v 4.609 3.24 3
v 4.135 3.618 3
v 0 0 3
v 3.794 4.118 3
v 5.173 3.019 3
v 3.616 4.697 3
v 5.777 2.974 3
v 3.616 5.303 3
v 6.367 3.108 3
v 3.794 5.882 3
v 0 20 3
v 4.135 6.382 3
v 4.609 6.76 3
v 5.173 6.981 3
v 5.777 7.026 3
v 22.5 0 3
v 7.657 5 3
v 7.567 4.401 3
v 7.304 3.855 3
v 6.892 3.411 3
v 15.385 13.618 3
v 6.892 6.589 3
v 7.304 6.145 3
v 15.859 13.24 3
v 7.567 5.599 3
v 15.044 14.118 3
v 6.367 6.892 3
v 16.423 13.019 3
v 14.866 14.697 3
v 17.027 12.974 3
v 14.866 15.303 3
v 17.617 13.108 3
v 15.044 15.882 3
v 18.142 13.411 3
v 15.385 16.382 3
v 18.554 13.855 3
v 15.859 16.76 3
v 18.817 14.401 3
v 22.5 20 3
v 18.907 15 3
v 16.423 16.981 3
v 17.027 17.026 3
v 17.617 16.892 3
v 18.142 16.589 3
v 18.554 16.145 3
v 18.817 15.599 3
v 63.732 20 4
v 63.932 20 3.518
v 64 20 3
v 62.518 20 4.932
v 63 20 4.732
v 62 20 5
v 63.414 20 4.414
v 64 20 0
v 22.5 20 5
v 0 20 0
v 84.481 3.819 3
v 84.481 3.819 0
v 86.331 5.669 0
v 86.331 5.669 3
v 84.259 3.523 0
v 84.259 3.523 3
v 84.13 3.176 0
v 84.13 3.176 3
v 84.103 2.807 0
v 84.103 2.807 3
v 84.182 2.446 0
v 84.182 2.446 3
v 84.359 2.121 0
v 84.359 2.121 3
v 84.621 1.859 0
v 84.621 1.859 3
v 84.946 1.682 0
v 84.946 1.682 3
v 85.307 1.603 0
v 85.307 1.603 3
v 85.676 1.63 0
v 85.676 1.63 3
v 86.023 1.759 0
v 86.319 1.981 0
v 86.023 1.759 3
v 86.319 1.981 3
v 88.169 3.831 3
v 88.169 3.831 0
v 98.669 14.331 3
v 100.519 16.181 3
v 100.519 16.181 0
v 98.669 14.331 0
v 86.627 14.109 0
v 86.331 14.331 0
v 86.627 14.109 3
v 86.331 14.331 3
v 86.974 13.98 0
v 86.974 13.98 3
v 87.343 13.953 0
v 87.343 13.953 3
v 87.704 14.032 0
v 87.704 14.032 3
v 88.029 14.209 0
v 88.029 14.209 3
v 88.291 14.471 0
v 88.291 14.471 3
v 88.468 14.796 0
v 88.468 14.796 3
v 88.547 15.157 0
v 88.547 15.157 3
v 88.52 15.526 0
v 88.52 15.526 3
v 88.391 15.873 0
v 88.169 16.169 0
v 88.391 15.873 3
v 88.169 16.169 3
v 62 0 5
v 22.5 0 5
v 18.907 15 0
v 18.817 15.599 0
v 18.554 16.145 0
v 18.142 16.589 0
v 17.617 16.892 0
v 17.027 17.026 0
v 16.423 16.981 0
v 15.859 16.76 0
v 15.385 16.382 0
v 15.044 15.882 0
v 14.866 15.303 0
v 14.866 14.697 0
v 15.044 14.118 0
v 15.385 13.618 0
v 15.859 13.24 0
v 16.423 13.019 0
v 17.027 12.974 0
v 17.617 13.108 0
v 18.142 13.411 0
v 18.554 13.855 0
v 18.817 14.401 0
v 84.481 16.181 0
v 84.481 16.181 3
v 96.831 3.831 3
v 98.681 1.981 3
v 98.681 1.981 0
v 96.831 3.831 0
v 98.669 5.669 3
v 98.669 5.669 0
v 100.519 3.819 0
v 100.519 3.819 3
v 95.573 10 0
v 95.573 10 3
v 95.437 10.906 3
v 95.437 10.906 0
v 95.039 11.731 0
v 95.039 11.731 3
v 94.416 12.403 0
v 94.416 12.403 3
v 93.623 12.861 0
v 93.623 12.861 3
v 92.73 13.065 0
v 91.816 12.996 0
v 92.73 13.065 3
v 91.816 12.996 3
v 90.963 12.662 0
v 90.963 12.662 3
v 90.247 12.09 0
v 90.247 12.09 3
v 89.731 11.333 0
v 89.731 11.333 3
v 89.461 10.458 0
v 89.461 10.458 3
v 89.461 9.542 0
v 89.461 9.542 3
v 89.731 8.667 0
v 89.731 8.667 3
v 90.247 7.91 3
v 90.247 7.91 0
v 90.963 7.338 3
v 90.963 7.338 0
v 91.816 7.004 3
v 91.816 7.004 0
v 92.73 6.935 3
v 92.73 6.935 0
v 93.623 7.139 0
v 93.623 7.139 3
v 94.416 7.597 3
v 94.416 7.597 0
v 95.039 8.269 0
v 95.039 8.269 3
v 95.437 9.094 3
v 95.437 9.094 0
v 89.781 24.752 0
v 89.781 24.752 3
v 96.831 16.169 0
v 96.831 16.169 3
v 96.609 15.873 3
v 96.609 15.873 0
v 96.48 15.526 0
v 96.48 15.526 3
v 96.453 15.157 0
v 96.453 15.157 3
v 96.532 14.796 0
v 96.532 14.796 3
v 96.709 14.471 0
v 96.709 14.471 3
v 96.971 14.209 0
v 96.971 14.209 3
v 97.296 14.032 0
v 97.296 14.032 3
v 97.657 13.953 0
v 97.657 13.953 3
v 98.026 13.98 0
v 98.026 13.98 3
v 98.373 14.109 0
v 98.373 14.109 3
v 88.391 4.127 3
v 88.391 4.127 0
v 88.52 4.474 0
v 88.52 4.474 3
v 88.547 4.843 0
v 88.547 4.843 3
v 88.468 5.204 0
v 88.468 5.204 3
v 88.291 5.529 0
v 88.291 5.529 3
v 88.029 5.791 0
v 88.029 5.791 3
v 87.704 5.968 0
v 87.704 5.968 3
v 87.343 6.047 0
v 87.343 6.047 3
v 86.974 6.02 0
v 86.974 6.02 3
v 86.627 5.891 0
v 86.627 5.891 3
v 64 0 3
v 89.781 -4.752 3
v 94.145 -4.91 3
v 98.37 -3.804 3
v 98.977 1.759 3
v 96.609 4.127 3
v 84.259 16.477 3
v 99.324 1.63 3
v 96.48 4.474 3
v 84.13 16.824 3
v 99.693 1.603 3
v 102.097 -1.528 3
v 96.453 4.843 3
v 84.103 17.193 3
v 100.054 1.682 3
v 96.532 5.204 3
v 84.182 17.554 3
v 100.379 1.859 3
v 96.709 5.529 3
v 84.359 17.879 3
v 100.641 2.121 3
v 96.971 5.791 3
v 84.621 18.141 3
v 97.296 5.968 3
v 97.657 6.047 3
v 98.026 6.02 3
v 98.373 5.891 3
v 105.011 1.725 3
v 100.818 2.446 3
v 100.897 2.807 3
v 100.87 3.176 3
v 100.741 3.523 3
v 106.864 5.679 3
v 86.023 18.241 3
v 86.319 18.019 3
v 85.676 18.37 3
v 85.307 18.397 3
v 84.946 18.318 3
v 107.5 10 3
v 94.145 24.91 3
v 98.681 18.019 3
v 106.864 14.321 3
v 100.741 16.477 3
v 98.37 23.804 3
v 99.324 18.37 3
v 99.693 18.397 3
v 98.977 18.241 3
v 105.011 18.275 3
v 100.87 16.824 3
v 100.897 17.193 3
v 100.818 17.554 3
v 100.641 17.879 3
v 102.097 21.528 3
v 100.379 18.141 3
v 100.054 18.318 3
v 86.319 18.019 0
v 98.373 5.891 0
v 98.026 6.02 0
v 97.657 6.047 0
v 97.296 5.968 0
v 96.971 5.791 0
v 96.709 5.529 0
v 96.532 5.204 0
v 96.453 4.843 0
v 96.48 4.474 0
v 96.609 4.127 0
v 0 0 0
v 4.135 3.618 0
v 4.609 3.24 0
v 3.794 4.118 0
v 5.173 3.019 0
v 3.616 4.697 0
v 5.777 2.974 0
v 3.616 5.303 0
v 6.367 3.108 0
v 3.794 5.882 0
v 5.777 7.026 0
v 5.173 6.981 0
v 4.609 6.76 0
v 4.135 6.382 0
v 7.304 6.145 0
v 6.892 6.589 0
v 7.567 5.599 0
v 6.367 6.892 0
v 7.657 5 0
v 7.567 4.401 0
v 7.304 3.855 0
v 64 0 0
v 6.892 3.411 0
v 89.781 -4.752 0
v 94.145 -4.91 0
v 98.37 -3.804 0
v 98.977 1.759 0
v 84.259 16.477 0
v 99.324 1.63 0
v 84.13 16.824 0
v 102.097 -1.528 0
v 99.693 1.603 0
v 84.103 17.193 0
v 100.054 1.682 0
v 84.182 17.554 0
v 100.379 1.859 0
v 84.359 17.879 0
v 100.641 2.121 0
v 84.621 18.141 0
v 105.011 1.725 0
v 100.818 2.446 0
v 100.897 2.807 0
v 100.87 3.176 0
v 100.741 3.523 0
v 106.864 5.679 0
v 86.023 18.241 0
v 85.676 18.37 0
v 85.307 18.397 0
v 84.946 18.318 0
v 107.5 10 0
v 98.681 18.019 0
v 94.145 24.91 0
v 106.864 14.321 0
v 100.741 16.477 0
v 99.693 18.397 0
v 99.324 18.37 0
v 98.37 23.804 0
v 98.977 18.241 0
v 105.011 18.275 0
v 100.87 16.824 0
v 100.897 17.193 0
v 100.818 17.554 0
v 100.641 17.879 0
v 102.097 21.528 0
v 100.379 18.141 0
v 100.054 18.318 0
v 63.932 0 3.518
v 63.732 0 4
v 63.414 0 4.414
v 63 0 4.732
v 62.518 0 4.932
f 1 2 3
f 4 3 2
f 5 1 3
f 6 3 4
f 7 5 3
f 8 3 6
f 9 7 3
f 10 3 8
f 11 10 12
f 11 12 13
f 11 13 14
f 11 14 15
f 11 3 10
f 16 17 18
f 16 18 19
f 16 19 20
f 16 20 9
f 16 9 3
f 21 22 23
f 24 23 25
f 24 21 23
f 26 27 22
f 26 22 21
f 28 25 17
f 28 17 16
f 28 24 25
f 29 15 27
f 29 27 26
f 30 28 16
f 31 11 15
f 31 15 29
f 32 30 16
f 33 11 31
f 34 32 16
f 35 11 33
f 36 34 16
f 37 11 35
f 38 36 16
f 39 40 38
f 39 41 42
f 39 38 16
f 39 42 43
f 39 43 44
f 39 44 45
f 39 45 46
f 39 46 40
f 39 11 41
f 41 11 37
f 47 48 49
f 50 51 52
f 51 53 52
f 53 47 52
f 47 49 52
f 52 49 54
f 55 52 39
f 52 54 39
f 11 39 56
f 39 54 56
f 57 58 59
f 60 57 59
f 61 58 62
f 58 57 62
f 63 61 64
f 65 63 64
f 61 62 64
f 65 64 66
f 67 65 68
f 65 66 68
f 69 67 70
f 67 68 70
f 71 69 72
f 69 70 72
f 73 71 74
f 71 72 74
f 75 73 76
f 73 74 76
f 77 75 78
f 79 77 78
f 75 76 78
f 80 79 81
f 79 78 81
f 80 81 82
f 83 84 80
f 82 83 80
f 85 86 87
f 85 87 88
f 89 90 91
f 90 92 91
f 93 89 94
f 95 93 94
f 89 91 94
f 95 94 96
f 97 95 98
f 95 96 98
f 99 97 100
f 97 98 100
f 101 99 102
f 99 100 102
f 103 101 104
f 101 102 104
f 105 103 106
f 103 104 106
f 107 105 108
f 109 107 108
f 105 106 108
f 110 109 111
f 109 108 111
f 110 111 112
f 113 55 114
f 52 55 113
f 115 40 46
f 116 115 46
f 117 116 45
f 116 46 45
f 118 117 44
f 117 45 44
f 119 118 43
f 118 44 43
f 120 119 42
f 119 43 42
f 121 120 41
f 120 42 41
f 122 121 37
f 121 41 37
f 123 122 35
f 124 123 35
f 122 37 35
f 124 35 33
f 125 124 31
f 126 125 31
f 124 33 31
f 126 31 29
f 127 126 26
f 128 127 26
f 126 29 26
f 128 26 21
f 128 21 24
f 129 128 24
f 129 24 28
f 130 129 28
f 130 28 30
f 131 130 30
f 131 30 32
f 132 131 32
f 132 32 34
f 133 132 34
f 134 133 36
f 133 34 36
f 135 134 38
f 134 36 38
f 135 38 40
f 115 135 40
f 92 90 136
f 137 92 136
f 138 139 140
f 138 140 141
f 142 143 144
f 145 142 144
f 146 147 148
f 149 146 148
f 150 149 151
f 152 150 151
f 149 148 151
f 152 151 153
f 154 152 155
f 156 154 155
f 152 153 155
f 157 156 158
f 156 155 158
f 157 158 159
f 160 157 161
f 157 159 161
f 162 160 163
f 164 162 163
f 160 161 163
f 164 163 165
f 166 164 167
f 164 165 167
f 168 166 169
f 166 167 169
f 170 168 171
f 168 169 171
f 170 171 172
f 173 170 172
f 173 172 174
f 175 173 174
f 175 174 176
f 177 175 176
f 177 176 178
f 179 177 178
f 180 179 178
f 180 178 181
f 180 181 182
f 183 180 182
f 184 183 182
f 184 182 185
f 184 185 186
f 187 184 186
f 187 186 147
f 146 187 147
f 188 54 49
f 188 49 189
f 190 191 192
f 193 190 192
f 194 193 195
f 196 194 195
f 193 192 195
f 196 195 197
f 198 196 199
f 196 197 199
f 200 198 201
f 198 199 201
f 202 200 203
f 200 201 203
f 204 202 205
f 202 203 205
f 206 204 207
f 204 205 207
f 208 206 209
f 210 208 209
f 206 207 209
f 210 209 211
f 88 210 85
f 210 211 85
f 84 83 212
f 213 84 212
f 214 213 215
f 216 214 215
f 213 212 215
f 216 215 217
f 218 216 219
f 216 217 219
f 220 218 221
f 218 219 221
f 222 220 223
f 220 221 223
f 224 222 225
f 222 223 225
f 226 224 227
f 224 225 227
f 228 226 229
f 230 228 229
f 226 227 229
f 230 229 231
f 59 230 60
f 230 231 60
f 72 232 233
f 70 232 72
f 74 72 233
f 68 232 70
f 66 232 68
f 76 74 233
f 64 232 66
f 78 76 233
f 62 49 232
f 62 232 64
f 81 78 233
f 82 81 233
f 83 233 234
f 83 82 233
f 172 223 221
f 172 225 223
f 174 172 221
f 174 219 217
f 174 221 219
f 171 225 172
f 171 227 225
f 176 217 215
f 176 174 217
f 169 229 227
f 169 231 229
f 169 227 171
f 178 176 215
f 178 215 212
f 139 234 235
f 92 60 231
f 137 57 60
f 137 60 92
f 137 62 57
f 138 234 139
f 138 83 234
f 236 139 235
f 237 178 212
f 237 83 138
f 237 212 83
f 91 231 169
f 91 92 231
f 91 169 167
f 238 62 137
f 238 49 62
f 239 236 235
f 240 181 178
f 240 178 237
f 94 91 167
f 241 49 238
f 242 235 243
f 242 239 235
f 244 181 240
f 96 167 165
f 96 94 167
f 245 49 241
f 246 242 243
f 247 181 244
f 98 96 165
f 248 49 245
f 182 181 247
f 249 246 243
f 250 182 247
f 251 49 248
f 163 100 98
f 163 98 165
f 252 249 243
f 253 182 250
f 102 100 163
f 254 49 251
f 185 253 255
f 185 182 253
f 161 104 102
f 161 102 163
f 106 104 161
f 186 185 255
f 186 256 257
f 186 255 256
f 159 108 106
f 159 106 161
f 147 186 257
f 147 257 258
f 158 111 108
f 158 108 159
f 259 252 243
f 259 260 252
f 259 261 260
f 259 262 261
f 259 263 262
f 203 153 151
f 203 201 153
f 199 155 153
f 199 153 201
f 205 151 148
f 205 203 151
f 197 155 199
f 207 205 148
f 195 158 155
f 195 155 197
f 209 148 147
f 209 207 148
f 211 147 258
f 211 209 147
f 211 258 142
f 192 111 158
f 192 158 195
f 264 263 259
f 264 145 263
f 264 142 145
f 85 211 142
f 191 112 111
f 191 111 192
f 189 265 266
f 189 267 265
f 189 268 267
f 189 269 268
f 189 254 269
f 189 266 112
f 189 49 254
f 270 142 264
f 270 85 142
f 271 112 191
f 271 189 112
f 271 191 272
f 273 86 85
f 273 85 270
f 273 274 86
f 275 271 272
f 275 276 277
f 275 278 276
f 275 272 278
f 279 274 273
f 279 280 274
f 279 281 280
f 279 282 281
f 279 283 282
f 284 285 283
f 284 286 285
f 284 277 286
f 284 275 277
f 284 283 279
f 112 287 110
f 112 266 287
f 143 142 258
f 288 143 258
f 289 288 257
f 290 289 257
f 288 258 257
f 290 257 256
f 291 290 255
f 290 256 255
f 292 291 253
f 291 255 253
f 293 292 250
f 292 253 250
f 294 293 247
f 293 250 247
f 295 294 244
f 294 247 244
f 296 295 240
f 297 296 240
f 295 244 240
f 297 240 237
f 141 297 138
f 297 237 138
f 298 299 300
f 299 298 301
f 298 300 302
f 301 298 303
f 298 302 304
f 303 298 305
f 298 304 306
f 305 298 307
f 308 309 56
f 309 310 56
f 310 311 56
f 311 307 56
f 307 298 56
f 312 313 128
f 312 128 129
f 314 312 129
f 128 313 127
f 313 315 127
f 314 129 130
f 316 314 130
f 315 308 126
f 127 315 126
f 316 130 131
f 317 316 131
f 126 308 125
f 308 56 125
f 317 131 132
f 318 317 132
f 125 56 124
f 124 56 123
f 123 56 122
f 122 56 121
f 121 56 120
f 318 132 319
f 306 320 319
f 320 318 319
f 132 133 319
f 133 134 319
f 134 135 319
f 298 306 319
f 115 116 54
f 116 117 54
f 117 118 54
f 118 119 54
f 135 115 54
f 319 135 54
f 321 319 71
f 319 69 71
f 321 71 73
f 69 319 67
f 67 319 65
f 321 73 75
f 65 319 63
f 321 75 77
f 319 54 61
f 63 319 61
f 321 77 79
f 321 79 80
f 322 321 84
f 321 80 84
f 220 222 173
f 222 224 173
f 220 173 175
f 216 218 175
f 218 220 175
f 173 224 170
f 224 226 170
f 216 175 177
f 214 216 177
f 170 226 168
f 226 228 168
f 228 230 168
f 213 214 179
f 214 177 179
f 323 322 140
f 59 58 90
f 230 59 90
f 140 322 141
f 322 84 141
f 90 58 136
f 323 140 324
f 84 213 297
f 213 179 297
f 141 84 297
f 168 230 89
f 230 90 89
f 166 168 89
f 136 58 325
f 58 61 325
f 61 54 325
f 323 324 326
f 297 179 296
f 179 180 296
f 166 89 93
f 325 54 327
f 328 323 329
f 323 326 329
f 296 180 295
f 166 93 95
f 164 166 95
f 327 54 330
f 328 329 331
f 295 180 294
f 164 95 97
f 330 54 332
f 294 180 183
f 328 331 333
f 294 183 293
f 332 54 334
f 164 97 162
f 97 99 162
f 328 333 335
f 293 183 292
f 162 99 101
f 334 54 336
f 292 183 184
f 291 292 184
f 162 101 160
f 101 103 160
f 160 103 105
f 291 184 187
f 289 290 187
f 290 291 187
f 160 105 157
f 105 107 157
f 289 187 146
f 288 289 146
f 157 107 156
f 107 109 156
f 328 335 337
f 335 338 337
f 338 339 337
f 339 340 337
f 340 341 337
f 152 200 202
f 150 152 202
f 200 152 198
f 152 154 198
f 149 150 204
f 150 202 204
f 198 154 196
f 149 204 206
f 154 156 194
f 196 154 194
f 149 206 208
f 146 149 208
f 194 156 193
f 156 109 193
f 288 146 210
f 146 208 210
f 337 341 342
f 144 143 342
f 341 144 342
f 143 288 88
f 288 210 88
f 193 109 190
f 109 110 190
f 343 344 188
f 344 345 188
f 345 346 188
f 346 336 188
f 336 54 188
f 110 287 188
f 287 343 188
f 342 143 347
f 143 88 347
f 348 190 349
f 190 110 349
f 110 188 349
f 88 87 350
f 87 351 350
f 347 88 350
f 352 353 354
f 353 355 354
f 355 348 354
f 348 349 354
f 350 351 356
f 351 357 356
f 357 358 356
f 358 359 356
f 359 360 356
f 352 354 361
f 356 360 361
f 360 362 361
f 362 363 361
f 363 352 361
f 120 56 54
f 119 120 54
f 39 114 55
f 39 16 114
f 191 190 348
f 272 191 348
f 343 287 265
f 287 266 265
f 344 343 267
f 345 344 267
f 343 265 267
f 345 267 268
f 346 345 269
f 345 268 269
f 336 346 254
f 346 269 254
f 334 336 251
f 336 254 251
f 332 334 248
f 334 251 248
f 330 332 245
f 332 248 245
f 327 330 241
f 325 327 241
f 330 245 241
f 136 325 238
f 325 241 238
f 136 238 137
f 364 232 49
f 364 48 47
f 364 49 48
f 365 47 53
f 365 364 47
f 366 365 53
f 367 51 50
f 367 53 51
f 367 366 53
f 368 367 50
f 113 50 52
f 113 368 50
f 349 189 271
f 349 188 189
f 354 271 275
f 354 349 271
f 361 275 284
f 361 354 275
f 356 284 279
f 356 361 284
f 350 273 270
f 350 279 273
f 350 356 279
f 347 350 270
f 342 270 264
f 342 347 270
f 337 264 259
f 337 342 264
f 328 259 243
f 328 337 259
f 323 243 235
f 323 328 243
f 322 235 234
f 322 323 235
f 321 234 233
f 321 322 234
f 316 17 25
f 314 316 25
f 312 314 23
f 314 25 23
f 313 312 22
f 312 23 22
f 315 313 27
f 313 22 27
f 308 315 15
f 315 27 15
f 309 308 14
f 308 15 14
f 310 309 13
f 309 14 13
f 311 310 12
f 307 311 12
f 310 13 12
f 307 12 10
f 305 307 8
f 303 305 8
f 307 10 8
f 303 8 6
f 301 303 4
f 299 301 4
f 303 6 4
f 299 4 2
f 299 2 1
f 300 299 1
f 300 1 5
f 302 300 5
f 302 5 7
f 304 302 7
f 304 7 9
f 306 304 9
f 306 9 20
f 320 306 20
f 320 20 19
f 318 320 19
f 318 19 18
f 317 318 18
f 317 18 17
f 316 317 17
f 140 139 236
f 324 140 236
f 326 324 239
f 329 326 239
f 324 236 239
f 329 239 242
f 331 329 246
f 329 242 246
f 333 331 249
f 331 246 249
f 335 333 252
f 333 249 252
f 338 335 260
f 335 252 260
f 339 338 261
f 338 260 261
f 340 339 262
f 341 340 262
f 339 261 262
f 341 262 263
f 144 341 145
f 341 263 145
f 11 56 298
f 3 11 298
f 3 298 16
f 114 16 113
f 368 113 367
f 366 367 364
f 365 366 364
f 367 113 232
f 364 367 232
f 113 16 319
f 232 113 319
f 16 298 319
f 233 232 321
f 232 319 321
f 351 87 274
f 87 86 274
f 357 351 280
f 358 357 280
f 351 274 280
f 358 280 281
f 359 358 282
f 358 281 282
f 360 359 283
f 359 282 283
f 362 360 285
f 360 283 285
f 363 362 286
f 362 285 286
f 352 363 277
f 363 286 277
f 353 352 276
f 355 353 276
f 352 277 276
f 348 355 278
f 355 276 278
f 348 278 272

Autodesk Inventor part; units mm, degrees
ref_plane "YZ Plane" through (0, 0, 0) normal (1, 0, 0) x (0, 1, 0)
ref_plane "XZ Plane" through (0, 0, 0) normal (0, 1, 0) x (-1, 0, 0)
ref_plane "XY Plane" through (0, 0, 0) normal (0, 0, 1) x (1, 0, 0)
sketch "Sketch1" plane through (0, 0, 0) normal (0, 0, 1) x (1, 0, 0)
  line L0 (0, 0) -> (64, 0)
  line L1 (64, 20) -> (0, 20)
  line L2 (0, 20) -> (0, 0)
  arc A0 (89.7812, -4.7516) -> (89.7812, 24.7516) centre (92.5, 10) ccw
  line L3 (64, 20) -> (89.7812, 24.7516)
  line L4 (64, 0) -> (89.7812, -4.7516)
  circle A1 centre (92.5, 10) radius 1.5
  dimension "d5" = 30
  dimension "d6" = 92.5
  dimension "d9" = 3
  dimension "d26" = 20
extrude "Extrusion1" add sketch "Sketch1" along normal blind 3 contours L2 L1 L3 A0 L4 L0 | A1
extrude "Extrusion2" cut sketch "Sketch1" along normal blind 10 contours A1
sketch "Sketch3" plane through (0, 0, 3) normal (0, 0, 1) x (1, 0, 0)
  circle A0 centre (92.5, 10) radius 1.5 projected
  circle A1 centre (92.5, 10) radius 1.5
  line L0 (92.5, 10) -> (128.0101, 10) construction
  arc A2 (96.8308, 16.1692) -> (98.6692, 14.3308) centre (97.75, 15.25) ccw
  arc A3 (100.5192, 16.1808) -> (98.6808, 18.0192) centre (99.6, 17.1) ccw
  line L1 (96.8308, 16.1692) -> (98.6808, 18.0192)
  line L2 (100.5192, 16.1808) -> (98.6692, 14.3308)
  point P0 (0, 0)
  dimension "d18" = 2.6
  dimension "d19" = 2.6
extrude "Extrusion3" cut sketch "Sketch3" against normal blind 10 contours L1 A3 L2 A2
pattern_circular "Circular Pattern1" count 4 over 360 about axis through (92.5, 10, 0) along (0, 0, 1) of "Extrusion3"
sketch "Sketch4" plane through (0, 0, 3) normal (0, 0, 1) x (1, 0, 0)
  circle A0 centre (5.625, 5) radius 1.6
  circle A1 centre (16.875, 15) radius 1.6
  point P0 (0, 0)
  dimension "d27" = 3.2
  dimension "d28" = 3.2
extrude "Extrusion4" cut sketch "Sketch4" against normal blind 10
sketch "Sketch5" plane through (0, 0, 3) normal (0, 0, 1) x (1, 0, 0)
  line L0 (91.1147, 10.2457) -> (94, 10)
  circle A0 centre (92.5, 10) radius 1.5 projected
  circle A1 centre (16.875, 15) radius 1.6 projected
  line L1 (17.5362, 16.511) -> (16.875, 15)
  circle A2 centre (5.625, 5) radius 1.6 projected
  line L2 (16.875, 15) -> (5.625, 5)
  circle A3 centre (16.875, 15) radius 2.032
  circle A4 centre (5.625, 5) radius 2.032
  point P0 (0, 0)
  dimension "d31" = 4.064
  dimension "d32" = 4.064
extrude "Extrusion5" cut sketch "Sketch5" against normal blind 10 contours A1 L2 L1 | A3 | A2 | A4 | L1 L2 A1
sketch "Sketch6" plane through (0, 0, 3) normal (0, 0, 1) x (1, 0, 0)
  circle A0 centre (92.5, 10) radius 1.5 projected
  line L0 (92.8215, 11.4329) -> (92.5, 10)
  circle A1 centre (92.5, 10) radius 3.0734
  point P0 (0, 0)
  dimension "d35" = 6.1468
extrude "Extrusion6" cut sketch "Sketch6" against normal blind 10
sketch "Sketch7" plane through (0, 0, 3) normal (0, 0, 1) x (1, 0, 0)
  point P0 (0, 0)
sketch "Sketch8" plane through (0, 0, 3) normal (0, 0, 1) x (1, 0, 0)
  point P0 (0, 0)
sketch "Sketch9" plane through (0, 0, 3) normal (0, 0, 1) x (1, 0, 0)
  point P0 (0, 0)
sketch "Sketch10" plane through (0, 0, 3) normal (0, 0, 1) x (1, 0, 0)
  line L0 (0, 0) -> (64, 0) projected
  line L1 (22.5, 0) -> (22.5, 20)
  line L2 (64, 20) -> (0, 20) projected
  line L3 (0, 20) -> (0, 0) projected
  line L4 (64, 20) -> (64, 0)
  dimension "d38" = 22.5
extrude "Extrusion7" add sketch "Sketch10" along normal blind 2 contours L1 L2 L4 L0
fillet "Fillet1" radius 2 1 edges at (64, 10, 5)
properties part number "Arm"
